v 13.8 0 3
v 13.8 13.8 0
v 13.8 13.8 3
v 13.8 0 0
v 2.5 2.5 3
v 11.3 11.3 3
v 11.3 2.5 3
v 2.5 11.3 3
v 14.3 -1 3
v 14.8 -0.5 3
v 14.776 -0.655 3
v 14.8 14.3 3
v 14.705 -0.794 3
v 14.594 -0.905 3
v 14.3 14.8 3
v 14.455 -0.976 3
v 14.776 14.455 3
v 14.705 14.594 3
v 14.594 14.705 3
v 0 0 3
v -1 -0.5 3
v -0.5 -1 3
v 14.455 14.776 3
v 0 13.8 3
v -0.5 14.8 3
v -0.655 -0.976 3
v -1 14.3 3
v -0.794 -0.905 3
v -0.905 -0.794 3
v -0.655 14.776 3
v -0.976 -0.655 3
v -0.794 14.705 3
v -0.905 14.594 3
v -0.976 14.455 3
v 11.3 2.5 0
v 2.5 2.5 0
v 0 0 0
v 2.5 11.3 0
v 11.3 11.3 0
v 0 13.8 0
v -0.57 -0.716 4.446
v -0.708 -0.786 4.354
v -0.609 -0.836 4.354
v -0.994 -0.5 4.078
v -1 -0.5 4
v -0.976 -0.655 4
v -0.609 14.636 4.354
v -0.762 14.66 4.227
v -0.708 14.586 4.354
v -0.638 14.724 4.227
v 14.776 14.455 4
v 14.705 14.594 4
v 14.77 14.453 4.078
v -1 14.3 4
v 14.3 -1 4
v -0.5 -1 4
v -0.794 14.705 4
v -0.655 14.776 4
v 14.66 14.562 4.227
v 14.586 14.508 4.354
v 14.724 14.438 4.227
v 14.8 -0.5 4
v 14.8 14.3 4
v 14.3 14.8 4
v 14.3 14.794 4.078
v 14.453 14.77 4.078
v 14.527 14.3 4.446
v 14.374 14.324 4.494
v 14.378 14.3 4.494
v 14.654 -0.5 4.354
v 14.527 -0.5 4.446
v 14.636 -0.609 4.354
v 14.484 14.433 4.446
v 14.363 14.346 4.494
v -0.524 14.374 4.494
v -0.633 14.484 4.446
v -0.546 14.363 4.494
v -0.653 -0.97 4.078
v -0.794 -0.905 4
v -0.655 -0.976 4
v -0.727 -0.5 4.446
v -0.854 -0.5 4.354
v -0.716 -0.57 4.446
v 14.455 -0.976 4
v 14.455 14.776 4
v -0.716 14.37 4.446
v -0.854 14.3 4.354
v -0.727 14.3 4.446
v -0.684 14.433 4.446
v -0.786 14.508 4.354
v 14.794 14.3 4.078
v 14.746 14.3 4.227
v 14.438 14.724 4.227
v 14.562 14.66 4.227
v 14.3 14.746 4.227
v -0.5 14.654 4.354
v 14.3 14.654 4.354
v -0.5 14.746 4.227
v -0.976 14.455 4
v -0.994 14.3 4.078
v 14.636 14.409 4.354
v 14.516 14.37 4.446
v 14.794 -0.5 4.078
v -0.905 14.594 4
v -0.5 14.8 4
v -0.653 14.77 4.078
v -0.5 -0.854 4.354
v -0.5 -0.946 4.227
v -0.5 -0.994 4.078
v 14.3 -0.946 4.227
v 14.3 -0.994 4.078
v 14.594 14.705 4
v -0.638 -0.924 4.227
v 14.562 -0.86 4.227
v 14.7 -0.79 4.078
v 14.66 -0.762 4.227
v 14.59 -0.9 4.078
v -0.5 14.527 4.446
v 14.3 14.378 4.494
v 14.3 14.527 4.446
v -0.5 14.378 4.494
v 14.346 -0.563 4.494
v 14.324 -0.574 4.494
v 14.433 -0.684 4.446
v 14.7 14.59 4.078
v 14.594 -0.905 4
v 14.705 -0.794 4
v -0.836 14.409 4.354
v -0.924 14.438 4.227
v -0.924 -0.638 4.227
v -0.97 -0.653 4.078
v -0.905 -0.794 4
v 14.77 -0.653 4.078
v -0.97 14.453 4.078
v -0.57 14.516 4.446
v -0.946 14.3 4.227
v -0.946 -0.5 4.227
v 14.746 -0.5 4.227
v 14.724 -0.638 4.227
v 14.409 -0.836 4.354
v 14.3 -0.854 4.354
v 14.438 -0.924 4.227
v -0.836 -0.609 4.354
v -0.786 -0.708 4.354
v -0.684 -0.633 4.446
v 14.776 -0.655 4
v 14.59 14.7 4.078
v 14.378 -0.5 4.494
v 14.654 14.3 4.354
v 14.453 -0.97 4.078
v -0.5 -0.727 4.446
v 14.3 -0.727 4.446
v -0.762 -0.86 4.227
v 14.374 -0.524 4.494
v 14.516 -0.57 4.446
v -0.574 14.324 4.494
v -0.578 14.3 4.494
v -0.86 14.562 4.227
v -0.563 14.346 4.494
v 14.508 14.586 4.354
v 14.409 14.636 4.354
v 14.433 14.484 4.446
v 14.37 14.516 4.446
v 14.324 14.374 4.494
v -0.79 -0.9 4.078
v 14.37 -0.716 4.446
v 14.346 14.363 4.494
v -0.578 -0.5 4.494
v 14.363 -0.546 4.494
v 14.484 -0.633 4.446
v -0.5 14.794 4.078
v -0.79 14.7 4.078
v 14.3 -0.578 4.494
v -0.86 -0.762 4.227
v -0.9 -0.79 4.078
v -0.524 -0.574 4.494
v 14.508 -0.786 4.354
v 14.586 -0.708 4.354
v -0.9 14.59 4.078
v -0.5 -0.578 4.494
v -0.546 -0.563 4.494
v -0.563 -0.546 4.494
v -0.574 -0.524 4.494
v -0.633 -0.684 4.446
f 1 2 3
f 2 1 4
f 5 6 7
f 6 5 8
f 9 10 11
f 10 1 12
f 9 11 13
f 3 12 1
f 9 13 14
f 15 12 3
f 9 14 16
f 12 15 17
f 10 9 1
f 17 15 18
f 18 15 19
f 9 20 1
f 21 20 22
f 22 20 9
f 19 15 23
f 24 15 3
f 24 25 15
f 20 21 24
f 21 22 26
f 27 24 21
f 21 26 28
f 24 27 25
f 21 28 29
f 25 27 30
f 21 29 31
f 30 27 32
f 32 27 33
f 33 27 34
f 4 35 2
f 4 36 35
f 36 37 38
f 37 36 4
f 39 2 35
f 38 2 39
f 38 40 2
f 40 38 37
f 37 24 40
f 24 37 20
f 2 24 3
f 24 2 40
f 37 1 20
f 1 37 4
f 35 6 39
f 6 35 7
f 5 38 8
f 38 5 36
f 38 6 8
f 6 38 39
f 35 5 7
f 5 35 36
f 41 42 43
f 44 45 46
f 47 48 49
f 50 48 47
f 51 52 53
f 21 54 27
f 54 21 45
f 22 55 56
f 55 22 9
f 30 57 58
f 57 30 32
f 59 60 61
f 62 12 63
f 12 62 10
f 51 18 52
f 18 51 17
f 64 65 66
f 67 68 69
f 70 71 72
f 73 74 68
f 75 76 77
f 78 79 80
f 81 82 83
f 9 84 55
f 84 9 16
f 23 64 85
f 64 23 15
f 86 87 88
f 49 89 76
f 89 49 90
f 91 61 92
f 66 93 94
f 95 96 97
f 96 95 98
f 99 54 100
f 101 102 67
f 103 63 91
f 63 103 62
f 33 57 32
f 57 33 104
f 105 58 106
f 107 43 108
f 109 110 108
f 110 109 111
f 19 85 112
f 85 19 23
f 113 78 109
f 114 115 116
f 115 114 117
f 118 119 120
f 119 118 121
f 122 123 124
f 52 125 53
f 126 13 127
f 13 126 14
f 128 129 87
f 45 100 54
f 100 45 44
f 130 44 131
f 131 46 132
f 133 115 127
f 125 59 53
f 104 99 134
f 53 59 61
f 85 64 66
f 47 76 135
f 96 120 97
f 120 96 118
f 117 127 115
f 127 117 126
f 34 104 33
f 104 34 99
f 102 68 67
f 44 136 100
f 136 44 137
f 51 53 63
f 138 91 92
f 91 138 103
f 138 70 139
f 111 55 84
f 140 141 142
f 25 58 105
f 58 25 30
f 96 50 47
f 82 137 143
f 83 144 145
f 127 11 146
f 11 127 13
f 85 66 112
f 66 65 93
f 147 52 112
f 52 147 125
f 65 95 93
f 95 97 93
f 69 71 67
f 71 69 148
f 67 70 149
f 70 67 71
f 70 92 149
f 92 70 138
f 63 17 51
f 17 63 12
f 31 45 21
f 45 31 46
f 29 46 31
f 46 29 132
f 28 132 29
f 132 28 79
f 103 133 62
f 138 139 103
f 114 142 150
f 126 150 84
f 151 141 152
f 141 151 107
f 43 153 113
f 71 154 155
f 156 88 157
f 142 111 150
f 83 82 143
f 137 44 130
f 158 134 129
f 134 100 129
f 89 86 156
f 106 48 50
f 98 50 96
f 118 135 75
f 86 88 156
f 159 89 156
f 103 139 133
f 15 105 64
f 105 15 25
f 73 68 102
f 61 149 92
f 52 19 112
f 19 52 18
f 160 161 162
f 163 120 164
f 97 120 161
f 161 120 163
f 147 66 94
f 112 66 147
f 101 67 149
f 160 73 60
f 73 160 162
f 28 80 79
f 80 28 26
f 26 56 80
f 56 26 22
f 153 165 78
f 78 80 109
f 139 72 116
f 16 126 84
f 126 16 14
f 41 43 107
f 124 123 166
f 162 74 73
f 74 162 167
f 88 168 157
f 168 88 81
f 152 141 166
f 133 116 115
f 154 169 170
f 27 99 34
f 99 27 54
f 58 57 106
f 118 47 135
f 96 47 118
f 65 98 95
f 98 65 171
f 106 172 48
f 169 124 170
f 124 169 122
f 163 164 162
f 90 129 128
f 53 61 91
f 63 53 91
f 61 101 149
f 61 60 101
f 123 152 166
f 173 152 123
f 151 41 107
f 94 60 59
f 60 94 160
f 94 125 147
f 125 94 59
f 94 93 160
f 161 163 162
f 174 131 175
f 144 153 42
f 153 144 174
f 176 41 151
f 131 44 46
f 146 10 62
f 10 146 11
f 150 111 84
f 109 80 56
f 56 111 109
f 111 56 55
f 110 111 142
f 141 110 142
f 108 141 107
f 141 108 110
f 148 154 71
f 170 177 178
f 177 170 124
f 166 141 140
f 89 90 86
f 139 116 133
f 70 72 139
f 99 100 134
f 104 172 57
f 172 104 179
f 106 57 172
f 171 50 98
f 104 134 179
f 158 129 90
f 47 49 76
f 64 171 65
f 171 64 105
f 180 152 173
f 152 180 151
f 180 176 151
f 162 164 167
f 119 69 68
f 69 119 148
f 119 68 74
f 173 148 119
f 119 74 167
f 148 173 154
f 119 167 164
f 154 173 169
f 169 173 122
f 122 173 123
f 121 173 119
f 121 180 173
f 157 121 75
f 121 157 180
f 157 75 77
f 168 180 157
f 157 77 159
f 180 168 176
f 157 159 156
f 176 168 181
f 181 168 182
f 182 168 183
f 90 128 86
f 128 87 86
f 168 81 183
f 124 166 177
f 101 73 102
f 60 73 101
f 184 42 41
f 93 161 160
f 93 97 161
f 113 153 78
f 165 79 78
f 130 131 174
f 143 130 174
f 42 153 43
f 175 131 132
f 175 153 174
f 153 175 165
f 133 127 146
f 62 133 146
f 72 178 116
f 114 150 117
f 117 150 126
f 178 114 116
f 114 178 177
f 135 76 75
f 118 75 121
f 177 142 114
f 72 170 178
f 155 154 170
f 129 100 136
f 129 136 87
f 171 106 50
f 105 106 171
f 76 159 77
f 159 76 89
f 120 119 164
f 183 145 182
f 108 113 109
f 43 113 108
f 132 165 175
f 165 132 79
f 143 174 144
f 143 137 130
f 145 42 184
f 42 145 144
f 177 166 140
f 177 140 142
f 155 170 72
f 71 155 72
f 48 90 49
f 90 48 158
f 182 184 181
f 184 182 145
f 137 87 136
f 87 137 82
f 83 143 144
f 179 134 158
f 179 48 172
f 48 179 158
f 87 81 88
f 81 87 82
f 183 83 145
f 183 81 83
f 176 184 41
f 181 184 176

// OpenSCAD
_plugWallThickness = 2.5;
_plugLength = 13.8;
_plugWidth = 13.8;
_plugDepth = 3;

_plugCutoutLength = _plugLength - _plugWallThickness*2;
_plugCutoutWidth = _plugWidth - _plugWallThickness*2;
_plugCutoutDepth = _plugDepth + 2;

_capBrimThickness = 1;
_capLength = _plugLength + _capBrimThickness*2;
_capWidth = _plugWidth + _capBrimThickness*2;
_capDepth = 1.5;

///MAIN START///

cap();

///MAIN END///

module cap()
{
    union()
    {
        difference()
        {
            cube([_plugLength, _plugWidth, _plugDepth]);
            translate([_plugWallThickness, _plugWallThickness, -1])
            cube([_plugCutoutLength, _plugCutoutWidth, _plugCutoutDepth]);
        }
        translate([-_capBrimThickness, -_capBrimThickness, _plugDepth])
        roundedCube(size=[_capLength,_capWidth,_capDepth], apply_to="zmax");
    }
}

//Utility
/// Builds a cube with rounded corners
/// size - dimension vector
/// center - centered on xyz planes?
/// radius - rounding radius
/// apply_to - which sides to round
module roundedCube(size = [1, 1, 1], center = false, radius = 0.5, apply_to = "all")
{
    // If single value, convert to [x, y, z] vector
    size = (size[0] == undef) ? [size, size, size] : size;

    translate_min = radius;
    translate_xmax = size[0] - radius;
    translate_ymax = size[1] - radius;
    translate_zmax = size[2] - radius;

    diameter = radius * 2;

    obj_translate = (center == false) ?
        [0, 0, 0] : [
            -(size[0] / 2),
            -(size[1] / 2),
            -(size[2] / 2)
        ];

    translate(v = obj_translate) {
        hull() {
            for (translate_x = [translate_min, translate_xmax]) {
                x_at = (translate_x == translate_min) ? "min" : "max";
                for (translate_y = [translate_min, translate_ymax]) {
                    y_at = (translate_y == translate_min) ? "min" : "max";
                    for (translate_z = [translate_min, translate_zmax]) {
                        z_at = (translate_z == translate_min) ? "min" : "max";

                        translate(v = [translate_x, translate_y, translate_z])
                        if (
                            (apply_to == "all") ||
                            (apply_to == "xmin" && x_at == "min") || (apply_to == "xmax" && x_at == "max") ||
                            (apply_to == "ymin" && y_at == "min") || (apply_to == "ymax" && y_at == "max") ||
                            (apply_to == "zmin" && z_at == "min") || (apply_to == "zmax" && z_at == "max")
                        ) {
                            sphere(r = radius, $fn=20);
                        } else {
                            rotate =
                                (apply_to == "xmin" || apply_to == "xmax" || apply_to == "x") ? [0, 90, 0] : (
                                (apply_to == "ymin" || apply_to == "ymax" || apply_to == "y") ? [90, 90, 0] :
                                [0, 0, 0]
                            );
                            rotate(a = rotate)
                            cylinder(h = diameter, r = radius, center = true, $fn=20);
                        }
                    }
                }
            }
        }
    }
}
